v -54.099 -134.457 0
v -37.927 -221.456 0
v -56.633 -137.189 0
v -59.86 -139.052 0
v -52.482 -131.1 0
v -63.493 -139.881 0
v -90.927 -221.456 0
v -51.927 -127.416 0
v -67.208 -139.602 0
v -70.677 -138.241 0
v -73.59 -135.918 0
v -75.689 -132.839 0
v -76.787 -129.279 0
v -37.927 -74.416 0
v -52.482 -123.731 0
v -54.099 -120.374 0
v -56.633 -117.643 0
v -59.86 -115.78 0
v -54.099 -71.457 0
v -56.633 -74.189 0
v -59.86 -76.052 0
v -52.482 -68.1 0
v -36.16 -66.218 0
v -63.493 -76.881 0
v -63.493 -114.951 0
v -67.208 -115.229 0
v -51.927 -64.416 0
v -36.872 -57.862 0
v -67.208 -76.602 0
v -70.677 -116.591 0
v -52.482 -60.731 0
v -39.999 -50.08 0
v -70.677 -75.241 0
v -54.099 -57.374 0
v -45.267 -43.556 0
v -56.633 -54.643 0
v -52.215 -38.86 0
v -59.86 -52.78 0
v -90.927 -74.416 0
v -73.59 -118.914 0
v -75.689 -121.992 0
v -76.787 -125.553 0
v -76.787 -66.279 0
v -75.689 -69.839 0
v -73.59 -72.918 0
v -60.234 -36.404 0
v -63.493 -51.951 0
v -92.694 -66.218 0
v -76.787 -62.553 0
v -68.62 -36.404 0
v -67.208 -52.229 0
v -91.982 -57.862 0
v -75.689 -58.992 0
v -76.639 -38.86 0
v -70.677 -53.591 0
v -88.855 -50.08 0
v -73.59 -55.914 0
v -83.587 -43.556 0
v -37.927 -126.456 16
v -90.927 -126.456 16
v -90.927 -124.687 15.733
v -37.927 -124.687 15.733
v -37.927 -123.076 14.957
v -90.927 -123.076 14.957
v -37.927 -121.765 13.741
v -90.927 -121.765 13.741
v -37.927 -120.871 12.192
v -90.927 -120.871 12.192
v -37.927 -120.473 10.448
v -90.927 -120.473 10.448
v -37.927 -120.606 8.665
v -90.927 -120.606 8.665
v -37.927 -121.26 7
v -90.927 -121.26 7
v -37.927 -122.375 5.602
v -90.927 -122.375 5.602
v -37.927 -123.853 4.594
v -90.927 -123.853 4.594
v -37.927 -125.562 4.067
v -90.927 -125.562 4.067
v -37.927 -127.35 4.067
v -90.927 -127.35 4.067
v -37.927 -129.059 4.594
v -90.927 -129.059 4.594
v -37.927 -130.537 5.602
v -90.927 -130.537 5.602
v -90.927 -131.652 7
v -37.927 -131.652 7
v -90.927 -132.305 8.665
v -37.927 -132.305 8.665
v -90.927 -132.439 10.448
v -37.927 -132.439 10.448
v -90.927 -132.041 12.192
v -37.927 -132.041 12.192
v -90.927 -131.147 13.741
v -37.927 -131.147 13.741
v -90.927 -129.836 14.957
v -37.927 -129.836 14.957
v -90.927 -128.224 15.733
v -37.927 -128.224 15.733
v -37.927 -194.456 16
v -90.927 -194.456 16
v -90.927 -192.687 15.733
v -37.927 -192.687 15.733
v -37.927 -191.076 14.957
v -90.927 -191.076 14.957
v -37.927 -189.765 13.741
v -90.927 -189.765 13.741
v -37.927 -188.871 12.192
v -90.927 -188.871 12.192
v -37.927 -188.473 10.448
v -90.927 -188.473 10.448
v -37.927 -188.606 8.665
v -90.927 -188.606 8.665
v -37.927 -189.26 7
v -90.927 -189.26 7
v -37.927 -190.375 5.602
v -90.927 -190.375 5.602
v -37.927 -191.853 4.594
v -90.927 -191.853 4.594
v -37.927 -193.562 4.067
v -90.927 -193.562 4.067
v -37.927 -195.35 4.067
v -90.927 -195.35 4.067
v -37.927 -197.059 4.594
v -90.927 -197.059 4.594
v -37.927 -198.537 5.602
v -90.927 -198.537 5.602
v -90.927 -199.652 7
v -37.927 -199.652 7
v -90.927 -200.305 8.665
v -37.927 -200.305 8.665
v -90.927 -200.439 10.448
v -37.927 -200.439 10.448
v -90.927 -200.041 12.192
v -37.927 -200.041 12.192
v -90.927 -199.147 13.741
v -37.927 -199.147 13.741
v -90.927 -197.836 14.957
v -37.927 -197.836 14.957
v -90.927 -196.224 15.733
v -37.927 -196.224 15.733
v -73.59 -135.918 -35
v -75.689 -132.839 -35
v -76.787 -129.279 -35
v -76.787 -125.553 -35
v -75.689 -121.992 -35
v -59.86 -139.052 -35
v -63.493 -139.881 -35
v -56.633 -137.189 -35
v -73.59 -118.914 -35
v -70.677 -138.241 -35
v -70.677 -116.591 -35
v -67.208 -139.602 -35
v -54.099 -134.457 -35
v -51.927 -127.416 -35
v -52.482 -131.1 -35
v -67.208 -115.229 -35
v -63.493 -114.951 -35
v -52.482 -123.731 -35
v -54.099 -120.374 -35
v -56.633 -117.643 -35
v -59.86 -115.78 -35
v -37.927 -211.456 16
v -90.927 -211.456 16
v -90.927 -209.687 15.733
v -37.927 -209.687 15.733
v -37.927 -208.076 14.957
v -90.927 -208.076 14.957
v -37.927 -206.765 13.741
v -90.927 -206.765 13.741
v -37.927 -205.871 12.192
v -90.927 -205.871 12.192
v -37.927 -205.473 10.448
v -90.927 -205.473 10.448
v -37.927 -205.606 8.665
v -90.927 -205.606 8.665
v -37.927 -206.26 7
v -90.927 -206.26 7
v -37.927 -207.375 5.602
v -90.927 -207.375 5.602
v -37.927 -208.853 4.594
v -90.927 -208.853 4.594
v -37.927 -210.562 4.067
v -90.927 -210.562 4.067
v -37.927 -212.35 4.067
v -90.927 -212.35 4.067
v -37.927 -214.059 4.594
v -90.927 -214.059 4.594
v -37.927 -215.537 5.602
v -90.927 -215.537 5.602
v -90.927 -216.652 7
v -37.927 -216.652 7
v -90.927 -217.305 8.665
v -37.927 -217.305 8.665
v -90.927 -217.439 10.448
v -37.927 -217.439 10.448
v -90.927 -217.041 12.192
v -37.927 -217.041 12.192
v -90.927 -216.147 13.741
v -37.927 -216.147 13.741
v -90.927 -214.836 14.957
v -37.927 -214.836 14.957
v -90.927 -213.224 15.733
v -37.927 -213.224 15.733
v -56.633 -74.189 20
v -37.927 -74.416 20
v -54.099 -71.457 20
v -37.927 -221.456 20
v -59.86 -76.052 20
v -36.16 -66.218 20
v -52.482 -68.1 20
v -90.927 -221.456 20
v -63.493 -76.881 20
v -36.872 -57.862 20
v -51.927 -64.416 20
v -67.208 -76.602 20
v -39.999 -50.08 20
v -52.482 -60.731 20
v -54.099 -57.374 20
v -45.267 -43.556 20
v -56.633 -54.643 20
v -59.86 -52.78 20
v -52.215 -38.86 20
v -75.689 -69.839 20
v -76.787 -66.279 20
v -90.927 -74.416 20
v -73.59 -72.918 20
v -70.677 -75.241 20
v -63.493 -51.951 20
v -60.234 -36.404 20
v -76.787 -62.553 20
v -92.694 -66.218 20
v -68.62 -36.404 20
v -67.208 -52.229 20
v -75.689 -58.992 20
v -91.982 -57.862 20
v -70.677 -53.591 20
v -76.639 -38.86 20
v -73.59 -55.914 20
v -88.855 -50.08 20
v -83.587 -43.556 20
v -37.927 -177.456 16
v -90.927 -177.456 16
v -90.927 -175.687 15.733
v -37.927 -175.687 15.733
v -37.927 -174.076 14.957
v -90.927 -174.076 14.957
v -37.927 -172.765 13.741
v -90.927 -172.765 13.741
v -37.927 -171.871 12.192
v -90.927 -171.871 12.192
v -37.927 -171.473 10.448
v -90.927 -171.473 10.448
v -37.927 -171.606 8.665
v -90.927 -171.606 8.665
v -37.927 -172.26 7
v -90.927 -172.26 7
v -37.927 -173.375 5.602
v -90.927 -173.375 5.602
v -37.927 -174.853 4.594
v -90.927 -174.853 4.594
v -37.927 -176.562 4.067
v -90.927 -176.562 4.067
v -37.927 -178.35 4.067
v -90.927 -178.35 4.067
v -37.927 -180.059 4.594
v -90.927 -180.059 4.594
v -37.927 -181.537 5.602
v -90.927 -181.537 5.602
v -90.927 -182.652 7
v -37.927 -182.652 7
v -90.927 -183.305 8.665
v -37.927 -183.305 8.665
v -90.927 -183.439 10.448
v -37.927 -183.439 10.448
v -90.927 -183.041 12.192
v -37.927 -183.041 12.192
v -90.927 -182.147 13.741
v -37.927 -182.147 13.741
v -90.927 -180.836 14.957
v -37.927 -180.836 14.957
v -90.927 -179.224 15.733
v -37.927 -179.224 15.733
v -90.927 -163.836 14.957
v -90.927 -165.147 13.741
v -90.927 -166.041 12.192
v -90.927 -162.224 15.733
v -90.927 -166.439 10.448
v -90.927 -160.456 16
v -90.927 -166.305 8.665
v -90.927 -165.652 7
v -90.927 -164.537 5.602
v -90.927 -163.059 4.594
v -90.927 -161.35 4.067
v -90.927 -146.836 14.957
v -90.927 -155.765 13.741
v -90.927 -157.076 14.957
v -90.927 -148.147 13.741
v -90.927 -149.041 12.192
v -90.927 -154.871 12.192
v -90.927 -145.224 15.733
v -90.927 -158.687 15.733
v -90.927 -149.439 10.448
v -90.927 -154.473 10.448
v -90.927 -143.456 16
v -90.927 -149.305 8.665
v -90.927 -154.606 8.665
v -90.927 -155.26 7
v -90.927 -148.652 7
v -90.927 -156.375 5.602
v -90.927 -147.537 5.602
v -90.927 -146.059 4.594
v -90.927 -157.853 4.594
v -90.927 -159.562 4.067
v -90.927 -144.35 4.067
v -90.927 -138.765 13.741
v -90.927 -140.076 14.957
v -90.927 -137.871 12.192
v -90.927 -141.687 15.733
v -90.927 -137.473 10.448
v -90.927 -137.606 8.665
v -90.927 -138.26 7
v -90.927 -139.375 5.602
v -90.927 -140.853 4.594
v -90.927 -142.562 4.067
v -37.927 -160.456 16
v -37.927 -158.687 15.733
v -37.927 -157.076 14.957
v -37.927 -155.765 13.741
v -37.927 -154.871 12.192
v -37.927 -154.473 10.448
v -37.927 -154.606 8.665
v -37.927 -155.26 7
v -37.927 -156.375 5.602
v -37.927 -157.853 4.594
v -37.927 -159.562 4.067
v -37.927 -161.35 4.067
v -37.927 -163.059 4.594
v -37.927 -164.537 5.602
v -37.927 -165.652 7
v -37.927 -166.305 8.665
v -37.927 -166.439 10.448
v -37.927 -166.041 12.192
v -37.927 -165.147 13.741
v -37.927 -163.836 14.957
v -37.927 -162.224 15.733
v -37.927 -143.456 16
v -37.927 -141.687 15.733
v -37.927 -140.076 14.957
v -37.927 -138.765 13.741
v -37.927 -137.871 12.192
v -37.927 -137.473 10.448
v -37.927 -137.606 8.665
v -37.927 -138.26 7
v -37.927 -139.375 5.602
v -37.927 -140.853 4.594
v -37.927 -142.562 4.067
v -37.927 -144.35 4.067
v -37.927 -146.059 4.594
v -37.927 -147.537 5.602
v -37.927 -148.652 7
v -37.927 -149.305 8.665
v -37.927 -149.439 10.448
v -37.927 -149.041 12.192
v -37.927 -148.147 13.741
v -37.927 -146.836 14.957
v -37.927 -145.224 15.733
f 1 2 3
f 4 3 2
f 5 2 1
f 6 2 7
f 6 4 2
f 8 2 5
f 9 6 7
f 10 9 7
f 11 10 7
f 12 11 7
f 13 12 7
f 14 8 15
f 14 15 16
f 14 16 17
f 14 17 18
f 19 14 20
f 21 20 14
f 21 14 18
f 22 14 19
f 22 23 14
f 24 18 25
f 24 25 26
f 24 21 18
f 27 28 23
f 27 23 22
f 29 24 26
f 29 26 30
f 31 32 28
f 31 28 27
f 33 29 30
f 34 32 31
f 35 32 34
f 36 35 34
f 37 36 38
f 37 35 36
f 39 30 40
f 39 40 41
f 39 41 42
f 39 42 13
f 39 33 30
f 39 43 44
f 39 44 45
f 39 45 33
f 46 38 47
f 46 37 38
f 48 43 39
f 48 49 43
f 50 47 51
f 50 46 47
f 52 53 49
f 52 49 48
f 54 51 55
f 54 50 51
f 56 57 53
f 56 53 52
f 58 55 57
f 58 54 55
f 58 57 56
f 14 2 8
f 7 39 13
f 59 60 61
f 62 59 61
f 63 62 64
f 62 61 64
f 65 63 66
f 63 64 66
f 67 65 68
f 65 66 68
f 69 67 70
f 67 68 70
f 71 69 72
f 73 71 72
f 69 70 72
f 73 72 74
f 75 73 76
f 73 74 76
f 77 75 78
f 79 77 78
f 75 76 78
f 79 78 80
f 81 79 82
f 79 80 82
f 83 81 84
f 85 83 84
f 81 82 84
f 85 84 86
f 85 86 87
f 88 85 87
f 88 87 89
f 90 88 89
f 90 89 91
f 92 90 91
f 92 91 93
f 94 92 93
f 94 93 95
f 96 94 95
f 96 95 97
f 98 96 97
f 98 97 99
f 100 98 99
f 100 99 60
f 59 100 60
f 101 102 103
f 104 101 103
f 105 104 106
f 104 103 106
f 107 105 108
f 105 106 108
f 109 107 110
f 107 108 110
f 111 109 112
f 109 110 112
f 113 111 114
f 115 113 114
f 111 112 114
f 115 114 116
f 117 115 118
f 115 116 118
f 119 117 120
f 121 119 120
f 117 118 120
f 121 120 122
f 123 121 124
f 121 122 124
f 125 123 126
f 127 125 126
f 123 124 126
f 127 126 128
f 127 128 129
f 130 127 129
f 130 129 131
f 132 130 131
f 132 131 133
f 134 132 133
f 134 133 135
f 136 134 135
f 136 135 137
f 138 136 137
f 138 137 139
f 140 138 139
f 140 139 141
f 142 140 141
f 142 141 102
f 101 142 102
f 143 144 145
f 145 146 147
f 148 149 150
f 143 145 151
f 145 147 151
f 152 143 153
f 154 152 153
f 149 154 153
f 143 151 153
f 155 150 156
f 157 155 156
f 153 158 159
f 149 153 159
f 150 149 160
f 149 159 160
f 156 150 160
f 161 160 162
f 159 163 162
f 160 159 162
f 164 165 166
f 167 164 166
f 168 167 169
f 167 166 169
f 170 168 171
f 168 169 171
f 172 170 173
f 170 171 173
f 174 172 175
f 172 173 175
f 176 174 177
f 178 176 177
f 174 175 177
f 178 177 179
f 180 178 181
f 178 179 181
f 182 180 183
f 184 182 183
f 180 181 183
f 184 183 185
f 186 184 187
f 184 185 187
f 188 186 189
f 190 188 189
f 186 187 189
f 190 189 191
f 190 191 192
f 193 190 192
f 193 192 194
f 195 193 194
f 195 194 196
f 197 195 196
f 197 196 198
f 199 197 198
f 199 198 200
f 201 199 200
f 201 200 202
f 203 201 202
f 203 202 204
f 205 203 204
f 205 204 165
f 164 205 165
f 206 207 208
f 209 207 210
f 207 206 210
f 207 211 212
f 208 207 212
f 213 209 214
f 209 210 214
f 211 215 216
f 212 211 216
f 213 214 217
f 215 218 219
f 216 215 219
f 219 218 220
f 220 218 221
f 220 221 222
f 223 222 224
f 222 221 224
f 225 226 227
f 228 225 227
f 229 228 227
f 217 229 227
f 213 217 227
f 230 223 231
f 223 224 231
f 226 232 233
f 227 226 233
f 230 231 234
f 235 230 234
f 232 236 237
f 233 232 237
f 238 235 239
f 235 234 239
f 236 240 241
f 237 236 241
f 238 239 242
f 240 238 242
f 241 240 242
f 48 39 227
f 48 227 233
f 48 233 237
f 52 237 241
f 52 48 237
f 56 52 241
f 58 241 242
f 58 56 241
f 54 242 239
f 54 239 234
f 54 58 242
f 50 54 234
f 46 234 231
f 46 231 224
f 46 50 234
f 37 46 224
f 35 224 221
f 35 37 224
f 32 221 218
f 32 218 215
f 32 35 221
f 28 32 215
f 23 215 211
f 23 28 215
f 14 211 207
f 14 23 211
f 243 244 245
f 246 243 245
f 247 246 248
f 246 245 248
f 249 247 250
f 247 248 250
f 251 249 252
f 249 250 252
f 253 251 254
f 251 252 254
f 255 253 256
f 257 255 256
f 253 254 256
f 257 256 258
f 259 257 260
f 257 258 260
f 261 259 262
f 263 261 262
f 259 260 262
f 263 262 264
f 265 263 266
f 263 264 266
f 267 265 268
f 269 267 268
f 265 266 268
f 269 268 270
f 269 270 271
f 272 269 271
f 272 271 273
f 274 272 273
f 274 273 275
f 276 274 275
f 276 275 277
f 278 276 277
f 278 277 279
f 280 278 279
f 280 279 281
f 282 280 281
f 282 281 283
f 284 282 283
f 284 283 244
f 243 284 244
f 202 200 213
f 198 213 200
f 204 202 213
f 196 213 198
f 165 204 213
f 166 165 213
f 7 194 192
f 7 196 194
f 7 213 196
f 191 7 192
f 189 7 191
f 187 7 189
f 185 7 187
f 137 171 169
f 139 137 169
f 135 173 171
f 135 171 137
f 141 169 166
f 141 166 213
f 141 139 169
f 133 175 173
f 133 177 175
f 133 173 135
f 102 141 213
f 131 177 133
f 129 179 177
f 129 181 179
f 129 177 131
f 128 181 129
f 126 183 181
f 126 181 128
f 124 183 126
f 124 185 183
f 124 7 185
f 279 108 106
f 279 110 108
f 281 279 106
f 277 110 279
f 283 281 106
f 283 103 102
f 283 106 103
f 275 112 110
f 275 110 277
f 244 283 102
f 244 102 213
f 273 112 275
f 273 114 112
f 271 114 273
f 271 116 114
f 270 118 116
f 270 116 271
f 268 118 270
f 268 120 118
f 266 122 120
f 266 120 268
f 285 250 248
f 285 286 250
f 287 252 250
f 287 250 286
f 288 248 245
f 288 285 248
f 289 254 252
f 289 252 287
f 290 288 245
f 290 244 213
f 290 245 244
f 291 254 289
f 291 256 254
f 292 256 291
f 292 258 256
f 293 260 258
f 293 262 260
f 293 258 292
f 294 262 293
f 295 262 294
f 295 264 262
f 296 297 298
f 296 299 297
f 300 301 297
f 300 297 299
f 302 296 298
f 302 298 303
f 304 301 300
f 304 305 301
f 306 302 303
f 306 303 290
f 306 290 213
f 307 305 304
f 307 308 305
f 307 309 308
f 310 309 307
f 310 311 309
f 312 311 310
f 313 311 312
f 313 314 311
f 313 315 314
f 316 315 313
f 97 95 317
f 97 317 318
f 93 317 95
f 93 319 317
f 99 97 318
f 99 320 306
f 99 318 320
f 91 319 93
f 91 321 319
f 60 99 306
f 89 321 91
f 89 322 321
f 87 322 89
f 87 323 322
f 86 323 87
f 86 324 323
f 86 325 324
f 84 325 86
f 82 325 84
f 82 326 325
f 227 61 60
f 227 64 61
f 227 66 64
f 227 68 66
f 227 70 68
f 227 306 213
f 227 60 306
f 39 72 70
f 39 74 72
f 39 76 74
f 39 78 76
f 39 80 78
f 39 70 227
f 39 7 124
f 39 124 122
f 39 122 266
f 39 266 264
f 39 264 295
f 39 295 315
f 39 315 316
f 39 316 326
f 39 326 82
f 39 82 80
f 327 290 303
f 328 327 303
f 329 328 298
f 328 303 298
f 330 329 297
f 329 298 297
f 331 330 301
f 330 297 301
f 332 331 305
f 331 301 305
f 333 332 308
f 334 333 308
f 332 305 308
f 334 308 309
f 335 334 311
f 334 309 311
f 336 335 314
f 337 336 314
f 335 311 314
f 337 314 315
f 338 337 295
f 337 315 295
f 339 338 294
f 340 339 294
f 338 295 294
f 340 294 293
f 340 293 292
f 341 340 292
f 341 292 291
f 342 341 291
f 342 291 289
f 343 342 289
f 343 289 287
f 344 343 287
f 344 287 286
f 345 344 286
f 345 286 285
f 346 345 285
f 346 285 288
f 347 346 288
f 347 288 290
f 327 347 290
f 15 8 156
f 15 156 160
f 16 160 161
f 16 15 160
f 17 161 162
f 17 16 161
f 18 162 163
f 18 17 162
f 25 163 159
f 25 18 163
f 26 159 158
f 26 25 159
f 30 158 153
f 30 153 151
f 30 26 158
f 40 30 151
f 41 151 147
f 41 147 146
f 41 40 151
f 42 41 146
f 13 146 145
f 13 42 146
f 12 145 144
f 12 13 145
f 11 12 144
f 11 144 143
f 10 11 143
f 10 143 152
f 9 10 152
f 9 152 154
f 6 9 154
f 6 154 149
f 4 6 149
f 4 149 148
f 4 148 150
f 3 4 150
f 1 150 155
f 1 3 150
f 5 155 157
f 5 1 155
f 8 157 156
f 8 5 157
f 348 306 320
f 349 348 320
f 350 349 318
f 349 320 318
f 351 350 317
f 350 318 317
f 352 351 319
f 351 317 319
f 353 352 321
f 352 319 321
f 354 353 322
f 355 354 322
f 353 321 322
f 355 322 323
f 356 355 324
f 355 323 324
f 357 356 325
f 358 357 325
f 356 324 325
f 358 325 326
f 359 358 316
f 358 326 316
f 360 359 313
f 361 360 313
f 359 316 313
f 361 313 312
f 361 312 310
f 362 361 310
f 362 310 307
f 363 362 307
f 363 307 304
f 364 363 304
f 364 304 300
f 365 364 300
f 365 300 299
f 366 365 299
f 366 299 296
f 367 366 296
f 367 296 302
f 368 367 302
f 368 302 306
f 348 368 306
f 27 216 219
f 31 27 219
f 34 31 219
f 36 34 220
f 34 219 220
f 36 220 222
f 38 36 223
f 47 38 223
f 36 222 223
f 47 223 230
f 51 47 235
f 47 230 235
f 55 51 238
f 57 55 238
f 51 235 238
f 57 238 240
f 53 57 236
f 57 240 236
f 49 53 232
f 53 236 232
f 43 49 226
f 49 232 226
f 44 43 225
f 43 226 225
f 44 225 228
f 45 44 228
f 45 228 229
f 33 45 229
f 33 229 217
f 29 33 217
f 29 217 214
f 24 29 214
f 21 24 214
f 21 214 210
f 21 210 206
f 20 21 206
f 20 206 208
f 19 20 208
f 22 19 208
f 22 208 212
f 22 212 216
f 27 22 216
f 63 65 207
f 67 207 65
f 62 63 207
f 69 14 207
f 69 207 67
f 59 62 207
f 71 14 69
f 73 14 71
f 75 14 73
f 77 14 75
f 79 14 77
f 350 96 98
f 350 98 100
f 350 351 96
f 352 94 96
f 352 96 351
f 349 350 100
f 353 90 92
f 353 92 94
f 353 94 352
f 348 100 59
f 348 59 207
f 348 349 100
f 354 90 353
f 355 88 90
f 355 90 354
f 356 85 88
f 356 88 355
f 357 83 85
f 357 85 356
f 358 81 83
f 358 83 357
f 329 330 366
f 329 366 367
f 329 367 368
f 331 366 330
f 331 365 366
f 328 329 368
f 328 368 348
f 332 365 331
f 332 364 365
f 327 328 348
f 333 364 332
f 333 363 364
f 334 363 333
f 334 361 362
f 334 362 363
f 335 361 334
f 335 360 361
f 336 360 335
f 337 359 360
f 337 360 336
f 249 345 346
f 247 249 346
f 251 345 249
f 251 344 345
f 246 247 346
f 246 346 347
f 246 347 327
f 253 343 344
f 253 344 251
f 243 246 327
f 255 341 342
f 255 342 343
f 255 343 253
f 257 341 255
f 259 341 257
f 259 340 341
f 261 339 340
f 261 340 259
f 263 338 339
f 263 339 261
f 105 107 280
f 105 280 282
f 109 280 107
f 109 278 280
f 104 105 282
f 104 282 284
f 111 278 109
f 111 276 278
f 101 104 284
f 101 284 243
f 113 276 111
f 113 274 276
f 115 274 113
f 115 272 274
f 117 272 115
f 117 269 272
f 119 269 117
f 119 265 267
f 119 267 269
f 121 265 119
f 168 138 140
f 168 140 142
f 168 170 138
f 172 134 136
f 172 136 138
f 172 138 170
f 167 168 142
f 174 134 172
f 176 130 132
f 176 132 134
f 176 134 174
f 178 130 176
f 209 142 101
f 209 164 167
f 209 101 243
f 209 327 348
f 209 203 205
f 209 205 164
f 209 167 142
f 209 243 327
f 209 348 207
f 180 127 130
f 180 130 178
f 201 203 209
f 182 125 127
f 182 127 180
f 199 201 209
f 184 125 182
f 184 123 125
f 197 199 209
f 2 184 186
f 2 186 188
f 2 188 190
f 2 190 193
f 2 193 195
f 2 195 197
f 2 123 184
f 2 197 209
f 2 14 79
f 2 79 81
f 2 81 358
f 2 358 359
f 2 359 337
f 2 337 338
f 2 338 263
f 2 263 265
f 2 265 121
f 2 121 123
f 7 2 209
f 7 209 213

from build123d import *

# Parameters (mm, degrees)
SKETCH2_R           = 10
BOSS_EXTRUDE2_DEPTH = 20
SKETCH8_R           = 6
CUT_EXTRUDE1_DEPTH  = 55.824018077
SKETCH6_R           = 6
CUT_EXTRUDE2_DEPTH  = 55.824018077
SKETCH9_R           = 12.5
CUT_EXTRUDE3_DEPTH  = 23
SKETCH11_R          = 12.5
BOSS_EXTRUDE4_DEPTH = 35


with BuildPart() as part:
    # Sketch2 → Boss-Extrude2 (new body)
    with BuildSketch(Plane.XY):
        with BuildLine():
            Line((-37.926977186, -74.415871925), (-37.926977186, -221.455871925))
            Line((-37.926977186, -221.455871925), (-90.926977186, -221.455871925))
            Line((-90.926977186, -221.455871925), (-90.926977186, -74.415871925))
            ThreePointArc((-90.926977186, -74.415871925), (-64.426977186, -36.091853848), (-37.926977186, -74.415871925))
        make_face()
        with Locations((-64.426977186, -64.415871925)):
            Circle(SKETCH2_R, mode=Mode.SUBTRACT)
    extrude(amount=BOSS_EXTRUDE2_DEPTH)

    # Sketch8 → Cut-Extrude1 (cut, through all)
    with BuildSketch(Plane.ZY.offset(90.926977186)):
        with Locations((10, -194.455871925)):
            Circle(SKETCH8_R)
        with Locations((10, -177.455871925)):
            Circle(SKETCH8_R)
        with Locations((10, -160.455871925)):
            Circle(SKETCH8_R)
        with Locations((10, -143.455871925)):
            Circle(SKETCH8_R)
        with Locations((10, -126.455871925)):
            Circle(SKETCH8_R)
    extrude(amount=-CUT_EXTRUDE1_DEPTH, mode=Mode.SUBTRACT)

    # Sketch6 → Cut-Extrude2 (cut, through all)
    with BuildSketch(Plane.ZY.offset(90.926977186)):
        with Locations((10, -211.455871925)):
            Circle(SKETCH6_R)
    extrude(amount=-CUT_EXTRUDE2_DEPTH, mode=Mode.SUBTRACT)

    # Sketch9 → Cut-Extrude3 (cut)
    with BuildSketch(Plane.XY.offset(20)):
        with Locations((-64.426977186, -64.415871925)):
            Circle(SKETCH9_R)
    extrude(amount=-CUT_EXTRUDE3_DEPTH, mode=Mode.SUBTRACT)

    # Sketch11 → Boss-Extrude4 (add)
    with BuildSketch(Plane.XY):
        with Locations((-64.426977186, -127.415871925)):
            Circle(SKETCH11_R)
    extrude(amount=-BOSS_EXTRUDE4_DEPTH)


solid = part.part
